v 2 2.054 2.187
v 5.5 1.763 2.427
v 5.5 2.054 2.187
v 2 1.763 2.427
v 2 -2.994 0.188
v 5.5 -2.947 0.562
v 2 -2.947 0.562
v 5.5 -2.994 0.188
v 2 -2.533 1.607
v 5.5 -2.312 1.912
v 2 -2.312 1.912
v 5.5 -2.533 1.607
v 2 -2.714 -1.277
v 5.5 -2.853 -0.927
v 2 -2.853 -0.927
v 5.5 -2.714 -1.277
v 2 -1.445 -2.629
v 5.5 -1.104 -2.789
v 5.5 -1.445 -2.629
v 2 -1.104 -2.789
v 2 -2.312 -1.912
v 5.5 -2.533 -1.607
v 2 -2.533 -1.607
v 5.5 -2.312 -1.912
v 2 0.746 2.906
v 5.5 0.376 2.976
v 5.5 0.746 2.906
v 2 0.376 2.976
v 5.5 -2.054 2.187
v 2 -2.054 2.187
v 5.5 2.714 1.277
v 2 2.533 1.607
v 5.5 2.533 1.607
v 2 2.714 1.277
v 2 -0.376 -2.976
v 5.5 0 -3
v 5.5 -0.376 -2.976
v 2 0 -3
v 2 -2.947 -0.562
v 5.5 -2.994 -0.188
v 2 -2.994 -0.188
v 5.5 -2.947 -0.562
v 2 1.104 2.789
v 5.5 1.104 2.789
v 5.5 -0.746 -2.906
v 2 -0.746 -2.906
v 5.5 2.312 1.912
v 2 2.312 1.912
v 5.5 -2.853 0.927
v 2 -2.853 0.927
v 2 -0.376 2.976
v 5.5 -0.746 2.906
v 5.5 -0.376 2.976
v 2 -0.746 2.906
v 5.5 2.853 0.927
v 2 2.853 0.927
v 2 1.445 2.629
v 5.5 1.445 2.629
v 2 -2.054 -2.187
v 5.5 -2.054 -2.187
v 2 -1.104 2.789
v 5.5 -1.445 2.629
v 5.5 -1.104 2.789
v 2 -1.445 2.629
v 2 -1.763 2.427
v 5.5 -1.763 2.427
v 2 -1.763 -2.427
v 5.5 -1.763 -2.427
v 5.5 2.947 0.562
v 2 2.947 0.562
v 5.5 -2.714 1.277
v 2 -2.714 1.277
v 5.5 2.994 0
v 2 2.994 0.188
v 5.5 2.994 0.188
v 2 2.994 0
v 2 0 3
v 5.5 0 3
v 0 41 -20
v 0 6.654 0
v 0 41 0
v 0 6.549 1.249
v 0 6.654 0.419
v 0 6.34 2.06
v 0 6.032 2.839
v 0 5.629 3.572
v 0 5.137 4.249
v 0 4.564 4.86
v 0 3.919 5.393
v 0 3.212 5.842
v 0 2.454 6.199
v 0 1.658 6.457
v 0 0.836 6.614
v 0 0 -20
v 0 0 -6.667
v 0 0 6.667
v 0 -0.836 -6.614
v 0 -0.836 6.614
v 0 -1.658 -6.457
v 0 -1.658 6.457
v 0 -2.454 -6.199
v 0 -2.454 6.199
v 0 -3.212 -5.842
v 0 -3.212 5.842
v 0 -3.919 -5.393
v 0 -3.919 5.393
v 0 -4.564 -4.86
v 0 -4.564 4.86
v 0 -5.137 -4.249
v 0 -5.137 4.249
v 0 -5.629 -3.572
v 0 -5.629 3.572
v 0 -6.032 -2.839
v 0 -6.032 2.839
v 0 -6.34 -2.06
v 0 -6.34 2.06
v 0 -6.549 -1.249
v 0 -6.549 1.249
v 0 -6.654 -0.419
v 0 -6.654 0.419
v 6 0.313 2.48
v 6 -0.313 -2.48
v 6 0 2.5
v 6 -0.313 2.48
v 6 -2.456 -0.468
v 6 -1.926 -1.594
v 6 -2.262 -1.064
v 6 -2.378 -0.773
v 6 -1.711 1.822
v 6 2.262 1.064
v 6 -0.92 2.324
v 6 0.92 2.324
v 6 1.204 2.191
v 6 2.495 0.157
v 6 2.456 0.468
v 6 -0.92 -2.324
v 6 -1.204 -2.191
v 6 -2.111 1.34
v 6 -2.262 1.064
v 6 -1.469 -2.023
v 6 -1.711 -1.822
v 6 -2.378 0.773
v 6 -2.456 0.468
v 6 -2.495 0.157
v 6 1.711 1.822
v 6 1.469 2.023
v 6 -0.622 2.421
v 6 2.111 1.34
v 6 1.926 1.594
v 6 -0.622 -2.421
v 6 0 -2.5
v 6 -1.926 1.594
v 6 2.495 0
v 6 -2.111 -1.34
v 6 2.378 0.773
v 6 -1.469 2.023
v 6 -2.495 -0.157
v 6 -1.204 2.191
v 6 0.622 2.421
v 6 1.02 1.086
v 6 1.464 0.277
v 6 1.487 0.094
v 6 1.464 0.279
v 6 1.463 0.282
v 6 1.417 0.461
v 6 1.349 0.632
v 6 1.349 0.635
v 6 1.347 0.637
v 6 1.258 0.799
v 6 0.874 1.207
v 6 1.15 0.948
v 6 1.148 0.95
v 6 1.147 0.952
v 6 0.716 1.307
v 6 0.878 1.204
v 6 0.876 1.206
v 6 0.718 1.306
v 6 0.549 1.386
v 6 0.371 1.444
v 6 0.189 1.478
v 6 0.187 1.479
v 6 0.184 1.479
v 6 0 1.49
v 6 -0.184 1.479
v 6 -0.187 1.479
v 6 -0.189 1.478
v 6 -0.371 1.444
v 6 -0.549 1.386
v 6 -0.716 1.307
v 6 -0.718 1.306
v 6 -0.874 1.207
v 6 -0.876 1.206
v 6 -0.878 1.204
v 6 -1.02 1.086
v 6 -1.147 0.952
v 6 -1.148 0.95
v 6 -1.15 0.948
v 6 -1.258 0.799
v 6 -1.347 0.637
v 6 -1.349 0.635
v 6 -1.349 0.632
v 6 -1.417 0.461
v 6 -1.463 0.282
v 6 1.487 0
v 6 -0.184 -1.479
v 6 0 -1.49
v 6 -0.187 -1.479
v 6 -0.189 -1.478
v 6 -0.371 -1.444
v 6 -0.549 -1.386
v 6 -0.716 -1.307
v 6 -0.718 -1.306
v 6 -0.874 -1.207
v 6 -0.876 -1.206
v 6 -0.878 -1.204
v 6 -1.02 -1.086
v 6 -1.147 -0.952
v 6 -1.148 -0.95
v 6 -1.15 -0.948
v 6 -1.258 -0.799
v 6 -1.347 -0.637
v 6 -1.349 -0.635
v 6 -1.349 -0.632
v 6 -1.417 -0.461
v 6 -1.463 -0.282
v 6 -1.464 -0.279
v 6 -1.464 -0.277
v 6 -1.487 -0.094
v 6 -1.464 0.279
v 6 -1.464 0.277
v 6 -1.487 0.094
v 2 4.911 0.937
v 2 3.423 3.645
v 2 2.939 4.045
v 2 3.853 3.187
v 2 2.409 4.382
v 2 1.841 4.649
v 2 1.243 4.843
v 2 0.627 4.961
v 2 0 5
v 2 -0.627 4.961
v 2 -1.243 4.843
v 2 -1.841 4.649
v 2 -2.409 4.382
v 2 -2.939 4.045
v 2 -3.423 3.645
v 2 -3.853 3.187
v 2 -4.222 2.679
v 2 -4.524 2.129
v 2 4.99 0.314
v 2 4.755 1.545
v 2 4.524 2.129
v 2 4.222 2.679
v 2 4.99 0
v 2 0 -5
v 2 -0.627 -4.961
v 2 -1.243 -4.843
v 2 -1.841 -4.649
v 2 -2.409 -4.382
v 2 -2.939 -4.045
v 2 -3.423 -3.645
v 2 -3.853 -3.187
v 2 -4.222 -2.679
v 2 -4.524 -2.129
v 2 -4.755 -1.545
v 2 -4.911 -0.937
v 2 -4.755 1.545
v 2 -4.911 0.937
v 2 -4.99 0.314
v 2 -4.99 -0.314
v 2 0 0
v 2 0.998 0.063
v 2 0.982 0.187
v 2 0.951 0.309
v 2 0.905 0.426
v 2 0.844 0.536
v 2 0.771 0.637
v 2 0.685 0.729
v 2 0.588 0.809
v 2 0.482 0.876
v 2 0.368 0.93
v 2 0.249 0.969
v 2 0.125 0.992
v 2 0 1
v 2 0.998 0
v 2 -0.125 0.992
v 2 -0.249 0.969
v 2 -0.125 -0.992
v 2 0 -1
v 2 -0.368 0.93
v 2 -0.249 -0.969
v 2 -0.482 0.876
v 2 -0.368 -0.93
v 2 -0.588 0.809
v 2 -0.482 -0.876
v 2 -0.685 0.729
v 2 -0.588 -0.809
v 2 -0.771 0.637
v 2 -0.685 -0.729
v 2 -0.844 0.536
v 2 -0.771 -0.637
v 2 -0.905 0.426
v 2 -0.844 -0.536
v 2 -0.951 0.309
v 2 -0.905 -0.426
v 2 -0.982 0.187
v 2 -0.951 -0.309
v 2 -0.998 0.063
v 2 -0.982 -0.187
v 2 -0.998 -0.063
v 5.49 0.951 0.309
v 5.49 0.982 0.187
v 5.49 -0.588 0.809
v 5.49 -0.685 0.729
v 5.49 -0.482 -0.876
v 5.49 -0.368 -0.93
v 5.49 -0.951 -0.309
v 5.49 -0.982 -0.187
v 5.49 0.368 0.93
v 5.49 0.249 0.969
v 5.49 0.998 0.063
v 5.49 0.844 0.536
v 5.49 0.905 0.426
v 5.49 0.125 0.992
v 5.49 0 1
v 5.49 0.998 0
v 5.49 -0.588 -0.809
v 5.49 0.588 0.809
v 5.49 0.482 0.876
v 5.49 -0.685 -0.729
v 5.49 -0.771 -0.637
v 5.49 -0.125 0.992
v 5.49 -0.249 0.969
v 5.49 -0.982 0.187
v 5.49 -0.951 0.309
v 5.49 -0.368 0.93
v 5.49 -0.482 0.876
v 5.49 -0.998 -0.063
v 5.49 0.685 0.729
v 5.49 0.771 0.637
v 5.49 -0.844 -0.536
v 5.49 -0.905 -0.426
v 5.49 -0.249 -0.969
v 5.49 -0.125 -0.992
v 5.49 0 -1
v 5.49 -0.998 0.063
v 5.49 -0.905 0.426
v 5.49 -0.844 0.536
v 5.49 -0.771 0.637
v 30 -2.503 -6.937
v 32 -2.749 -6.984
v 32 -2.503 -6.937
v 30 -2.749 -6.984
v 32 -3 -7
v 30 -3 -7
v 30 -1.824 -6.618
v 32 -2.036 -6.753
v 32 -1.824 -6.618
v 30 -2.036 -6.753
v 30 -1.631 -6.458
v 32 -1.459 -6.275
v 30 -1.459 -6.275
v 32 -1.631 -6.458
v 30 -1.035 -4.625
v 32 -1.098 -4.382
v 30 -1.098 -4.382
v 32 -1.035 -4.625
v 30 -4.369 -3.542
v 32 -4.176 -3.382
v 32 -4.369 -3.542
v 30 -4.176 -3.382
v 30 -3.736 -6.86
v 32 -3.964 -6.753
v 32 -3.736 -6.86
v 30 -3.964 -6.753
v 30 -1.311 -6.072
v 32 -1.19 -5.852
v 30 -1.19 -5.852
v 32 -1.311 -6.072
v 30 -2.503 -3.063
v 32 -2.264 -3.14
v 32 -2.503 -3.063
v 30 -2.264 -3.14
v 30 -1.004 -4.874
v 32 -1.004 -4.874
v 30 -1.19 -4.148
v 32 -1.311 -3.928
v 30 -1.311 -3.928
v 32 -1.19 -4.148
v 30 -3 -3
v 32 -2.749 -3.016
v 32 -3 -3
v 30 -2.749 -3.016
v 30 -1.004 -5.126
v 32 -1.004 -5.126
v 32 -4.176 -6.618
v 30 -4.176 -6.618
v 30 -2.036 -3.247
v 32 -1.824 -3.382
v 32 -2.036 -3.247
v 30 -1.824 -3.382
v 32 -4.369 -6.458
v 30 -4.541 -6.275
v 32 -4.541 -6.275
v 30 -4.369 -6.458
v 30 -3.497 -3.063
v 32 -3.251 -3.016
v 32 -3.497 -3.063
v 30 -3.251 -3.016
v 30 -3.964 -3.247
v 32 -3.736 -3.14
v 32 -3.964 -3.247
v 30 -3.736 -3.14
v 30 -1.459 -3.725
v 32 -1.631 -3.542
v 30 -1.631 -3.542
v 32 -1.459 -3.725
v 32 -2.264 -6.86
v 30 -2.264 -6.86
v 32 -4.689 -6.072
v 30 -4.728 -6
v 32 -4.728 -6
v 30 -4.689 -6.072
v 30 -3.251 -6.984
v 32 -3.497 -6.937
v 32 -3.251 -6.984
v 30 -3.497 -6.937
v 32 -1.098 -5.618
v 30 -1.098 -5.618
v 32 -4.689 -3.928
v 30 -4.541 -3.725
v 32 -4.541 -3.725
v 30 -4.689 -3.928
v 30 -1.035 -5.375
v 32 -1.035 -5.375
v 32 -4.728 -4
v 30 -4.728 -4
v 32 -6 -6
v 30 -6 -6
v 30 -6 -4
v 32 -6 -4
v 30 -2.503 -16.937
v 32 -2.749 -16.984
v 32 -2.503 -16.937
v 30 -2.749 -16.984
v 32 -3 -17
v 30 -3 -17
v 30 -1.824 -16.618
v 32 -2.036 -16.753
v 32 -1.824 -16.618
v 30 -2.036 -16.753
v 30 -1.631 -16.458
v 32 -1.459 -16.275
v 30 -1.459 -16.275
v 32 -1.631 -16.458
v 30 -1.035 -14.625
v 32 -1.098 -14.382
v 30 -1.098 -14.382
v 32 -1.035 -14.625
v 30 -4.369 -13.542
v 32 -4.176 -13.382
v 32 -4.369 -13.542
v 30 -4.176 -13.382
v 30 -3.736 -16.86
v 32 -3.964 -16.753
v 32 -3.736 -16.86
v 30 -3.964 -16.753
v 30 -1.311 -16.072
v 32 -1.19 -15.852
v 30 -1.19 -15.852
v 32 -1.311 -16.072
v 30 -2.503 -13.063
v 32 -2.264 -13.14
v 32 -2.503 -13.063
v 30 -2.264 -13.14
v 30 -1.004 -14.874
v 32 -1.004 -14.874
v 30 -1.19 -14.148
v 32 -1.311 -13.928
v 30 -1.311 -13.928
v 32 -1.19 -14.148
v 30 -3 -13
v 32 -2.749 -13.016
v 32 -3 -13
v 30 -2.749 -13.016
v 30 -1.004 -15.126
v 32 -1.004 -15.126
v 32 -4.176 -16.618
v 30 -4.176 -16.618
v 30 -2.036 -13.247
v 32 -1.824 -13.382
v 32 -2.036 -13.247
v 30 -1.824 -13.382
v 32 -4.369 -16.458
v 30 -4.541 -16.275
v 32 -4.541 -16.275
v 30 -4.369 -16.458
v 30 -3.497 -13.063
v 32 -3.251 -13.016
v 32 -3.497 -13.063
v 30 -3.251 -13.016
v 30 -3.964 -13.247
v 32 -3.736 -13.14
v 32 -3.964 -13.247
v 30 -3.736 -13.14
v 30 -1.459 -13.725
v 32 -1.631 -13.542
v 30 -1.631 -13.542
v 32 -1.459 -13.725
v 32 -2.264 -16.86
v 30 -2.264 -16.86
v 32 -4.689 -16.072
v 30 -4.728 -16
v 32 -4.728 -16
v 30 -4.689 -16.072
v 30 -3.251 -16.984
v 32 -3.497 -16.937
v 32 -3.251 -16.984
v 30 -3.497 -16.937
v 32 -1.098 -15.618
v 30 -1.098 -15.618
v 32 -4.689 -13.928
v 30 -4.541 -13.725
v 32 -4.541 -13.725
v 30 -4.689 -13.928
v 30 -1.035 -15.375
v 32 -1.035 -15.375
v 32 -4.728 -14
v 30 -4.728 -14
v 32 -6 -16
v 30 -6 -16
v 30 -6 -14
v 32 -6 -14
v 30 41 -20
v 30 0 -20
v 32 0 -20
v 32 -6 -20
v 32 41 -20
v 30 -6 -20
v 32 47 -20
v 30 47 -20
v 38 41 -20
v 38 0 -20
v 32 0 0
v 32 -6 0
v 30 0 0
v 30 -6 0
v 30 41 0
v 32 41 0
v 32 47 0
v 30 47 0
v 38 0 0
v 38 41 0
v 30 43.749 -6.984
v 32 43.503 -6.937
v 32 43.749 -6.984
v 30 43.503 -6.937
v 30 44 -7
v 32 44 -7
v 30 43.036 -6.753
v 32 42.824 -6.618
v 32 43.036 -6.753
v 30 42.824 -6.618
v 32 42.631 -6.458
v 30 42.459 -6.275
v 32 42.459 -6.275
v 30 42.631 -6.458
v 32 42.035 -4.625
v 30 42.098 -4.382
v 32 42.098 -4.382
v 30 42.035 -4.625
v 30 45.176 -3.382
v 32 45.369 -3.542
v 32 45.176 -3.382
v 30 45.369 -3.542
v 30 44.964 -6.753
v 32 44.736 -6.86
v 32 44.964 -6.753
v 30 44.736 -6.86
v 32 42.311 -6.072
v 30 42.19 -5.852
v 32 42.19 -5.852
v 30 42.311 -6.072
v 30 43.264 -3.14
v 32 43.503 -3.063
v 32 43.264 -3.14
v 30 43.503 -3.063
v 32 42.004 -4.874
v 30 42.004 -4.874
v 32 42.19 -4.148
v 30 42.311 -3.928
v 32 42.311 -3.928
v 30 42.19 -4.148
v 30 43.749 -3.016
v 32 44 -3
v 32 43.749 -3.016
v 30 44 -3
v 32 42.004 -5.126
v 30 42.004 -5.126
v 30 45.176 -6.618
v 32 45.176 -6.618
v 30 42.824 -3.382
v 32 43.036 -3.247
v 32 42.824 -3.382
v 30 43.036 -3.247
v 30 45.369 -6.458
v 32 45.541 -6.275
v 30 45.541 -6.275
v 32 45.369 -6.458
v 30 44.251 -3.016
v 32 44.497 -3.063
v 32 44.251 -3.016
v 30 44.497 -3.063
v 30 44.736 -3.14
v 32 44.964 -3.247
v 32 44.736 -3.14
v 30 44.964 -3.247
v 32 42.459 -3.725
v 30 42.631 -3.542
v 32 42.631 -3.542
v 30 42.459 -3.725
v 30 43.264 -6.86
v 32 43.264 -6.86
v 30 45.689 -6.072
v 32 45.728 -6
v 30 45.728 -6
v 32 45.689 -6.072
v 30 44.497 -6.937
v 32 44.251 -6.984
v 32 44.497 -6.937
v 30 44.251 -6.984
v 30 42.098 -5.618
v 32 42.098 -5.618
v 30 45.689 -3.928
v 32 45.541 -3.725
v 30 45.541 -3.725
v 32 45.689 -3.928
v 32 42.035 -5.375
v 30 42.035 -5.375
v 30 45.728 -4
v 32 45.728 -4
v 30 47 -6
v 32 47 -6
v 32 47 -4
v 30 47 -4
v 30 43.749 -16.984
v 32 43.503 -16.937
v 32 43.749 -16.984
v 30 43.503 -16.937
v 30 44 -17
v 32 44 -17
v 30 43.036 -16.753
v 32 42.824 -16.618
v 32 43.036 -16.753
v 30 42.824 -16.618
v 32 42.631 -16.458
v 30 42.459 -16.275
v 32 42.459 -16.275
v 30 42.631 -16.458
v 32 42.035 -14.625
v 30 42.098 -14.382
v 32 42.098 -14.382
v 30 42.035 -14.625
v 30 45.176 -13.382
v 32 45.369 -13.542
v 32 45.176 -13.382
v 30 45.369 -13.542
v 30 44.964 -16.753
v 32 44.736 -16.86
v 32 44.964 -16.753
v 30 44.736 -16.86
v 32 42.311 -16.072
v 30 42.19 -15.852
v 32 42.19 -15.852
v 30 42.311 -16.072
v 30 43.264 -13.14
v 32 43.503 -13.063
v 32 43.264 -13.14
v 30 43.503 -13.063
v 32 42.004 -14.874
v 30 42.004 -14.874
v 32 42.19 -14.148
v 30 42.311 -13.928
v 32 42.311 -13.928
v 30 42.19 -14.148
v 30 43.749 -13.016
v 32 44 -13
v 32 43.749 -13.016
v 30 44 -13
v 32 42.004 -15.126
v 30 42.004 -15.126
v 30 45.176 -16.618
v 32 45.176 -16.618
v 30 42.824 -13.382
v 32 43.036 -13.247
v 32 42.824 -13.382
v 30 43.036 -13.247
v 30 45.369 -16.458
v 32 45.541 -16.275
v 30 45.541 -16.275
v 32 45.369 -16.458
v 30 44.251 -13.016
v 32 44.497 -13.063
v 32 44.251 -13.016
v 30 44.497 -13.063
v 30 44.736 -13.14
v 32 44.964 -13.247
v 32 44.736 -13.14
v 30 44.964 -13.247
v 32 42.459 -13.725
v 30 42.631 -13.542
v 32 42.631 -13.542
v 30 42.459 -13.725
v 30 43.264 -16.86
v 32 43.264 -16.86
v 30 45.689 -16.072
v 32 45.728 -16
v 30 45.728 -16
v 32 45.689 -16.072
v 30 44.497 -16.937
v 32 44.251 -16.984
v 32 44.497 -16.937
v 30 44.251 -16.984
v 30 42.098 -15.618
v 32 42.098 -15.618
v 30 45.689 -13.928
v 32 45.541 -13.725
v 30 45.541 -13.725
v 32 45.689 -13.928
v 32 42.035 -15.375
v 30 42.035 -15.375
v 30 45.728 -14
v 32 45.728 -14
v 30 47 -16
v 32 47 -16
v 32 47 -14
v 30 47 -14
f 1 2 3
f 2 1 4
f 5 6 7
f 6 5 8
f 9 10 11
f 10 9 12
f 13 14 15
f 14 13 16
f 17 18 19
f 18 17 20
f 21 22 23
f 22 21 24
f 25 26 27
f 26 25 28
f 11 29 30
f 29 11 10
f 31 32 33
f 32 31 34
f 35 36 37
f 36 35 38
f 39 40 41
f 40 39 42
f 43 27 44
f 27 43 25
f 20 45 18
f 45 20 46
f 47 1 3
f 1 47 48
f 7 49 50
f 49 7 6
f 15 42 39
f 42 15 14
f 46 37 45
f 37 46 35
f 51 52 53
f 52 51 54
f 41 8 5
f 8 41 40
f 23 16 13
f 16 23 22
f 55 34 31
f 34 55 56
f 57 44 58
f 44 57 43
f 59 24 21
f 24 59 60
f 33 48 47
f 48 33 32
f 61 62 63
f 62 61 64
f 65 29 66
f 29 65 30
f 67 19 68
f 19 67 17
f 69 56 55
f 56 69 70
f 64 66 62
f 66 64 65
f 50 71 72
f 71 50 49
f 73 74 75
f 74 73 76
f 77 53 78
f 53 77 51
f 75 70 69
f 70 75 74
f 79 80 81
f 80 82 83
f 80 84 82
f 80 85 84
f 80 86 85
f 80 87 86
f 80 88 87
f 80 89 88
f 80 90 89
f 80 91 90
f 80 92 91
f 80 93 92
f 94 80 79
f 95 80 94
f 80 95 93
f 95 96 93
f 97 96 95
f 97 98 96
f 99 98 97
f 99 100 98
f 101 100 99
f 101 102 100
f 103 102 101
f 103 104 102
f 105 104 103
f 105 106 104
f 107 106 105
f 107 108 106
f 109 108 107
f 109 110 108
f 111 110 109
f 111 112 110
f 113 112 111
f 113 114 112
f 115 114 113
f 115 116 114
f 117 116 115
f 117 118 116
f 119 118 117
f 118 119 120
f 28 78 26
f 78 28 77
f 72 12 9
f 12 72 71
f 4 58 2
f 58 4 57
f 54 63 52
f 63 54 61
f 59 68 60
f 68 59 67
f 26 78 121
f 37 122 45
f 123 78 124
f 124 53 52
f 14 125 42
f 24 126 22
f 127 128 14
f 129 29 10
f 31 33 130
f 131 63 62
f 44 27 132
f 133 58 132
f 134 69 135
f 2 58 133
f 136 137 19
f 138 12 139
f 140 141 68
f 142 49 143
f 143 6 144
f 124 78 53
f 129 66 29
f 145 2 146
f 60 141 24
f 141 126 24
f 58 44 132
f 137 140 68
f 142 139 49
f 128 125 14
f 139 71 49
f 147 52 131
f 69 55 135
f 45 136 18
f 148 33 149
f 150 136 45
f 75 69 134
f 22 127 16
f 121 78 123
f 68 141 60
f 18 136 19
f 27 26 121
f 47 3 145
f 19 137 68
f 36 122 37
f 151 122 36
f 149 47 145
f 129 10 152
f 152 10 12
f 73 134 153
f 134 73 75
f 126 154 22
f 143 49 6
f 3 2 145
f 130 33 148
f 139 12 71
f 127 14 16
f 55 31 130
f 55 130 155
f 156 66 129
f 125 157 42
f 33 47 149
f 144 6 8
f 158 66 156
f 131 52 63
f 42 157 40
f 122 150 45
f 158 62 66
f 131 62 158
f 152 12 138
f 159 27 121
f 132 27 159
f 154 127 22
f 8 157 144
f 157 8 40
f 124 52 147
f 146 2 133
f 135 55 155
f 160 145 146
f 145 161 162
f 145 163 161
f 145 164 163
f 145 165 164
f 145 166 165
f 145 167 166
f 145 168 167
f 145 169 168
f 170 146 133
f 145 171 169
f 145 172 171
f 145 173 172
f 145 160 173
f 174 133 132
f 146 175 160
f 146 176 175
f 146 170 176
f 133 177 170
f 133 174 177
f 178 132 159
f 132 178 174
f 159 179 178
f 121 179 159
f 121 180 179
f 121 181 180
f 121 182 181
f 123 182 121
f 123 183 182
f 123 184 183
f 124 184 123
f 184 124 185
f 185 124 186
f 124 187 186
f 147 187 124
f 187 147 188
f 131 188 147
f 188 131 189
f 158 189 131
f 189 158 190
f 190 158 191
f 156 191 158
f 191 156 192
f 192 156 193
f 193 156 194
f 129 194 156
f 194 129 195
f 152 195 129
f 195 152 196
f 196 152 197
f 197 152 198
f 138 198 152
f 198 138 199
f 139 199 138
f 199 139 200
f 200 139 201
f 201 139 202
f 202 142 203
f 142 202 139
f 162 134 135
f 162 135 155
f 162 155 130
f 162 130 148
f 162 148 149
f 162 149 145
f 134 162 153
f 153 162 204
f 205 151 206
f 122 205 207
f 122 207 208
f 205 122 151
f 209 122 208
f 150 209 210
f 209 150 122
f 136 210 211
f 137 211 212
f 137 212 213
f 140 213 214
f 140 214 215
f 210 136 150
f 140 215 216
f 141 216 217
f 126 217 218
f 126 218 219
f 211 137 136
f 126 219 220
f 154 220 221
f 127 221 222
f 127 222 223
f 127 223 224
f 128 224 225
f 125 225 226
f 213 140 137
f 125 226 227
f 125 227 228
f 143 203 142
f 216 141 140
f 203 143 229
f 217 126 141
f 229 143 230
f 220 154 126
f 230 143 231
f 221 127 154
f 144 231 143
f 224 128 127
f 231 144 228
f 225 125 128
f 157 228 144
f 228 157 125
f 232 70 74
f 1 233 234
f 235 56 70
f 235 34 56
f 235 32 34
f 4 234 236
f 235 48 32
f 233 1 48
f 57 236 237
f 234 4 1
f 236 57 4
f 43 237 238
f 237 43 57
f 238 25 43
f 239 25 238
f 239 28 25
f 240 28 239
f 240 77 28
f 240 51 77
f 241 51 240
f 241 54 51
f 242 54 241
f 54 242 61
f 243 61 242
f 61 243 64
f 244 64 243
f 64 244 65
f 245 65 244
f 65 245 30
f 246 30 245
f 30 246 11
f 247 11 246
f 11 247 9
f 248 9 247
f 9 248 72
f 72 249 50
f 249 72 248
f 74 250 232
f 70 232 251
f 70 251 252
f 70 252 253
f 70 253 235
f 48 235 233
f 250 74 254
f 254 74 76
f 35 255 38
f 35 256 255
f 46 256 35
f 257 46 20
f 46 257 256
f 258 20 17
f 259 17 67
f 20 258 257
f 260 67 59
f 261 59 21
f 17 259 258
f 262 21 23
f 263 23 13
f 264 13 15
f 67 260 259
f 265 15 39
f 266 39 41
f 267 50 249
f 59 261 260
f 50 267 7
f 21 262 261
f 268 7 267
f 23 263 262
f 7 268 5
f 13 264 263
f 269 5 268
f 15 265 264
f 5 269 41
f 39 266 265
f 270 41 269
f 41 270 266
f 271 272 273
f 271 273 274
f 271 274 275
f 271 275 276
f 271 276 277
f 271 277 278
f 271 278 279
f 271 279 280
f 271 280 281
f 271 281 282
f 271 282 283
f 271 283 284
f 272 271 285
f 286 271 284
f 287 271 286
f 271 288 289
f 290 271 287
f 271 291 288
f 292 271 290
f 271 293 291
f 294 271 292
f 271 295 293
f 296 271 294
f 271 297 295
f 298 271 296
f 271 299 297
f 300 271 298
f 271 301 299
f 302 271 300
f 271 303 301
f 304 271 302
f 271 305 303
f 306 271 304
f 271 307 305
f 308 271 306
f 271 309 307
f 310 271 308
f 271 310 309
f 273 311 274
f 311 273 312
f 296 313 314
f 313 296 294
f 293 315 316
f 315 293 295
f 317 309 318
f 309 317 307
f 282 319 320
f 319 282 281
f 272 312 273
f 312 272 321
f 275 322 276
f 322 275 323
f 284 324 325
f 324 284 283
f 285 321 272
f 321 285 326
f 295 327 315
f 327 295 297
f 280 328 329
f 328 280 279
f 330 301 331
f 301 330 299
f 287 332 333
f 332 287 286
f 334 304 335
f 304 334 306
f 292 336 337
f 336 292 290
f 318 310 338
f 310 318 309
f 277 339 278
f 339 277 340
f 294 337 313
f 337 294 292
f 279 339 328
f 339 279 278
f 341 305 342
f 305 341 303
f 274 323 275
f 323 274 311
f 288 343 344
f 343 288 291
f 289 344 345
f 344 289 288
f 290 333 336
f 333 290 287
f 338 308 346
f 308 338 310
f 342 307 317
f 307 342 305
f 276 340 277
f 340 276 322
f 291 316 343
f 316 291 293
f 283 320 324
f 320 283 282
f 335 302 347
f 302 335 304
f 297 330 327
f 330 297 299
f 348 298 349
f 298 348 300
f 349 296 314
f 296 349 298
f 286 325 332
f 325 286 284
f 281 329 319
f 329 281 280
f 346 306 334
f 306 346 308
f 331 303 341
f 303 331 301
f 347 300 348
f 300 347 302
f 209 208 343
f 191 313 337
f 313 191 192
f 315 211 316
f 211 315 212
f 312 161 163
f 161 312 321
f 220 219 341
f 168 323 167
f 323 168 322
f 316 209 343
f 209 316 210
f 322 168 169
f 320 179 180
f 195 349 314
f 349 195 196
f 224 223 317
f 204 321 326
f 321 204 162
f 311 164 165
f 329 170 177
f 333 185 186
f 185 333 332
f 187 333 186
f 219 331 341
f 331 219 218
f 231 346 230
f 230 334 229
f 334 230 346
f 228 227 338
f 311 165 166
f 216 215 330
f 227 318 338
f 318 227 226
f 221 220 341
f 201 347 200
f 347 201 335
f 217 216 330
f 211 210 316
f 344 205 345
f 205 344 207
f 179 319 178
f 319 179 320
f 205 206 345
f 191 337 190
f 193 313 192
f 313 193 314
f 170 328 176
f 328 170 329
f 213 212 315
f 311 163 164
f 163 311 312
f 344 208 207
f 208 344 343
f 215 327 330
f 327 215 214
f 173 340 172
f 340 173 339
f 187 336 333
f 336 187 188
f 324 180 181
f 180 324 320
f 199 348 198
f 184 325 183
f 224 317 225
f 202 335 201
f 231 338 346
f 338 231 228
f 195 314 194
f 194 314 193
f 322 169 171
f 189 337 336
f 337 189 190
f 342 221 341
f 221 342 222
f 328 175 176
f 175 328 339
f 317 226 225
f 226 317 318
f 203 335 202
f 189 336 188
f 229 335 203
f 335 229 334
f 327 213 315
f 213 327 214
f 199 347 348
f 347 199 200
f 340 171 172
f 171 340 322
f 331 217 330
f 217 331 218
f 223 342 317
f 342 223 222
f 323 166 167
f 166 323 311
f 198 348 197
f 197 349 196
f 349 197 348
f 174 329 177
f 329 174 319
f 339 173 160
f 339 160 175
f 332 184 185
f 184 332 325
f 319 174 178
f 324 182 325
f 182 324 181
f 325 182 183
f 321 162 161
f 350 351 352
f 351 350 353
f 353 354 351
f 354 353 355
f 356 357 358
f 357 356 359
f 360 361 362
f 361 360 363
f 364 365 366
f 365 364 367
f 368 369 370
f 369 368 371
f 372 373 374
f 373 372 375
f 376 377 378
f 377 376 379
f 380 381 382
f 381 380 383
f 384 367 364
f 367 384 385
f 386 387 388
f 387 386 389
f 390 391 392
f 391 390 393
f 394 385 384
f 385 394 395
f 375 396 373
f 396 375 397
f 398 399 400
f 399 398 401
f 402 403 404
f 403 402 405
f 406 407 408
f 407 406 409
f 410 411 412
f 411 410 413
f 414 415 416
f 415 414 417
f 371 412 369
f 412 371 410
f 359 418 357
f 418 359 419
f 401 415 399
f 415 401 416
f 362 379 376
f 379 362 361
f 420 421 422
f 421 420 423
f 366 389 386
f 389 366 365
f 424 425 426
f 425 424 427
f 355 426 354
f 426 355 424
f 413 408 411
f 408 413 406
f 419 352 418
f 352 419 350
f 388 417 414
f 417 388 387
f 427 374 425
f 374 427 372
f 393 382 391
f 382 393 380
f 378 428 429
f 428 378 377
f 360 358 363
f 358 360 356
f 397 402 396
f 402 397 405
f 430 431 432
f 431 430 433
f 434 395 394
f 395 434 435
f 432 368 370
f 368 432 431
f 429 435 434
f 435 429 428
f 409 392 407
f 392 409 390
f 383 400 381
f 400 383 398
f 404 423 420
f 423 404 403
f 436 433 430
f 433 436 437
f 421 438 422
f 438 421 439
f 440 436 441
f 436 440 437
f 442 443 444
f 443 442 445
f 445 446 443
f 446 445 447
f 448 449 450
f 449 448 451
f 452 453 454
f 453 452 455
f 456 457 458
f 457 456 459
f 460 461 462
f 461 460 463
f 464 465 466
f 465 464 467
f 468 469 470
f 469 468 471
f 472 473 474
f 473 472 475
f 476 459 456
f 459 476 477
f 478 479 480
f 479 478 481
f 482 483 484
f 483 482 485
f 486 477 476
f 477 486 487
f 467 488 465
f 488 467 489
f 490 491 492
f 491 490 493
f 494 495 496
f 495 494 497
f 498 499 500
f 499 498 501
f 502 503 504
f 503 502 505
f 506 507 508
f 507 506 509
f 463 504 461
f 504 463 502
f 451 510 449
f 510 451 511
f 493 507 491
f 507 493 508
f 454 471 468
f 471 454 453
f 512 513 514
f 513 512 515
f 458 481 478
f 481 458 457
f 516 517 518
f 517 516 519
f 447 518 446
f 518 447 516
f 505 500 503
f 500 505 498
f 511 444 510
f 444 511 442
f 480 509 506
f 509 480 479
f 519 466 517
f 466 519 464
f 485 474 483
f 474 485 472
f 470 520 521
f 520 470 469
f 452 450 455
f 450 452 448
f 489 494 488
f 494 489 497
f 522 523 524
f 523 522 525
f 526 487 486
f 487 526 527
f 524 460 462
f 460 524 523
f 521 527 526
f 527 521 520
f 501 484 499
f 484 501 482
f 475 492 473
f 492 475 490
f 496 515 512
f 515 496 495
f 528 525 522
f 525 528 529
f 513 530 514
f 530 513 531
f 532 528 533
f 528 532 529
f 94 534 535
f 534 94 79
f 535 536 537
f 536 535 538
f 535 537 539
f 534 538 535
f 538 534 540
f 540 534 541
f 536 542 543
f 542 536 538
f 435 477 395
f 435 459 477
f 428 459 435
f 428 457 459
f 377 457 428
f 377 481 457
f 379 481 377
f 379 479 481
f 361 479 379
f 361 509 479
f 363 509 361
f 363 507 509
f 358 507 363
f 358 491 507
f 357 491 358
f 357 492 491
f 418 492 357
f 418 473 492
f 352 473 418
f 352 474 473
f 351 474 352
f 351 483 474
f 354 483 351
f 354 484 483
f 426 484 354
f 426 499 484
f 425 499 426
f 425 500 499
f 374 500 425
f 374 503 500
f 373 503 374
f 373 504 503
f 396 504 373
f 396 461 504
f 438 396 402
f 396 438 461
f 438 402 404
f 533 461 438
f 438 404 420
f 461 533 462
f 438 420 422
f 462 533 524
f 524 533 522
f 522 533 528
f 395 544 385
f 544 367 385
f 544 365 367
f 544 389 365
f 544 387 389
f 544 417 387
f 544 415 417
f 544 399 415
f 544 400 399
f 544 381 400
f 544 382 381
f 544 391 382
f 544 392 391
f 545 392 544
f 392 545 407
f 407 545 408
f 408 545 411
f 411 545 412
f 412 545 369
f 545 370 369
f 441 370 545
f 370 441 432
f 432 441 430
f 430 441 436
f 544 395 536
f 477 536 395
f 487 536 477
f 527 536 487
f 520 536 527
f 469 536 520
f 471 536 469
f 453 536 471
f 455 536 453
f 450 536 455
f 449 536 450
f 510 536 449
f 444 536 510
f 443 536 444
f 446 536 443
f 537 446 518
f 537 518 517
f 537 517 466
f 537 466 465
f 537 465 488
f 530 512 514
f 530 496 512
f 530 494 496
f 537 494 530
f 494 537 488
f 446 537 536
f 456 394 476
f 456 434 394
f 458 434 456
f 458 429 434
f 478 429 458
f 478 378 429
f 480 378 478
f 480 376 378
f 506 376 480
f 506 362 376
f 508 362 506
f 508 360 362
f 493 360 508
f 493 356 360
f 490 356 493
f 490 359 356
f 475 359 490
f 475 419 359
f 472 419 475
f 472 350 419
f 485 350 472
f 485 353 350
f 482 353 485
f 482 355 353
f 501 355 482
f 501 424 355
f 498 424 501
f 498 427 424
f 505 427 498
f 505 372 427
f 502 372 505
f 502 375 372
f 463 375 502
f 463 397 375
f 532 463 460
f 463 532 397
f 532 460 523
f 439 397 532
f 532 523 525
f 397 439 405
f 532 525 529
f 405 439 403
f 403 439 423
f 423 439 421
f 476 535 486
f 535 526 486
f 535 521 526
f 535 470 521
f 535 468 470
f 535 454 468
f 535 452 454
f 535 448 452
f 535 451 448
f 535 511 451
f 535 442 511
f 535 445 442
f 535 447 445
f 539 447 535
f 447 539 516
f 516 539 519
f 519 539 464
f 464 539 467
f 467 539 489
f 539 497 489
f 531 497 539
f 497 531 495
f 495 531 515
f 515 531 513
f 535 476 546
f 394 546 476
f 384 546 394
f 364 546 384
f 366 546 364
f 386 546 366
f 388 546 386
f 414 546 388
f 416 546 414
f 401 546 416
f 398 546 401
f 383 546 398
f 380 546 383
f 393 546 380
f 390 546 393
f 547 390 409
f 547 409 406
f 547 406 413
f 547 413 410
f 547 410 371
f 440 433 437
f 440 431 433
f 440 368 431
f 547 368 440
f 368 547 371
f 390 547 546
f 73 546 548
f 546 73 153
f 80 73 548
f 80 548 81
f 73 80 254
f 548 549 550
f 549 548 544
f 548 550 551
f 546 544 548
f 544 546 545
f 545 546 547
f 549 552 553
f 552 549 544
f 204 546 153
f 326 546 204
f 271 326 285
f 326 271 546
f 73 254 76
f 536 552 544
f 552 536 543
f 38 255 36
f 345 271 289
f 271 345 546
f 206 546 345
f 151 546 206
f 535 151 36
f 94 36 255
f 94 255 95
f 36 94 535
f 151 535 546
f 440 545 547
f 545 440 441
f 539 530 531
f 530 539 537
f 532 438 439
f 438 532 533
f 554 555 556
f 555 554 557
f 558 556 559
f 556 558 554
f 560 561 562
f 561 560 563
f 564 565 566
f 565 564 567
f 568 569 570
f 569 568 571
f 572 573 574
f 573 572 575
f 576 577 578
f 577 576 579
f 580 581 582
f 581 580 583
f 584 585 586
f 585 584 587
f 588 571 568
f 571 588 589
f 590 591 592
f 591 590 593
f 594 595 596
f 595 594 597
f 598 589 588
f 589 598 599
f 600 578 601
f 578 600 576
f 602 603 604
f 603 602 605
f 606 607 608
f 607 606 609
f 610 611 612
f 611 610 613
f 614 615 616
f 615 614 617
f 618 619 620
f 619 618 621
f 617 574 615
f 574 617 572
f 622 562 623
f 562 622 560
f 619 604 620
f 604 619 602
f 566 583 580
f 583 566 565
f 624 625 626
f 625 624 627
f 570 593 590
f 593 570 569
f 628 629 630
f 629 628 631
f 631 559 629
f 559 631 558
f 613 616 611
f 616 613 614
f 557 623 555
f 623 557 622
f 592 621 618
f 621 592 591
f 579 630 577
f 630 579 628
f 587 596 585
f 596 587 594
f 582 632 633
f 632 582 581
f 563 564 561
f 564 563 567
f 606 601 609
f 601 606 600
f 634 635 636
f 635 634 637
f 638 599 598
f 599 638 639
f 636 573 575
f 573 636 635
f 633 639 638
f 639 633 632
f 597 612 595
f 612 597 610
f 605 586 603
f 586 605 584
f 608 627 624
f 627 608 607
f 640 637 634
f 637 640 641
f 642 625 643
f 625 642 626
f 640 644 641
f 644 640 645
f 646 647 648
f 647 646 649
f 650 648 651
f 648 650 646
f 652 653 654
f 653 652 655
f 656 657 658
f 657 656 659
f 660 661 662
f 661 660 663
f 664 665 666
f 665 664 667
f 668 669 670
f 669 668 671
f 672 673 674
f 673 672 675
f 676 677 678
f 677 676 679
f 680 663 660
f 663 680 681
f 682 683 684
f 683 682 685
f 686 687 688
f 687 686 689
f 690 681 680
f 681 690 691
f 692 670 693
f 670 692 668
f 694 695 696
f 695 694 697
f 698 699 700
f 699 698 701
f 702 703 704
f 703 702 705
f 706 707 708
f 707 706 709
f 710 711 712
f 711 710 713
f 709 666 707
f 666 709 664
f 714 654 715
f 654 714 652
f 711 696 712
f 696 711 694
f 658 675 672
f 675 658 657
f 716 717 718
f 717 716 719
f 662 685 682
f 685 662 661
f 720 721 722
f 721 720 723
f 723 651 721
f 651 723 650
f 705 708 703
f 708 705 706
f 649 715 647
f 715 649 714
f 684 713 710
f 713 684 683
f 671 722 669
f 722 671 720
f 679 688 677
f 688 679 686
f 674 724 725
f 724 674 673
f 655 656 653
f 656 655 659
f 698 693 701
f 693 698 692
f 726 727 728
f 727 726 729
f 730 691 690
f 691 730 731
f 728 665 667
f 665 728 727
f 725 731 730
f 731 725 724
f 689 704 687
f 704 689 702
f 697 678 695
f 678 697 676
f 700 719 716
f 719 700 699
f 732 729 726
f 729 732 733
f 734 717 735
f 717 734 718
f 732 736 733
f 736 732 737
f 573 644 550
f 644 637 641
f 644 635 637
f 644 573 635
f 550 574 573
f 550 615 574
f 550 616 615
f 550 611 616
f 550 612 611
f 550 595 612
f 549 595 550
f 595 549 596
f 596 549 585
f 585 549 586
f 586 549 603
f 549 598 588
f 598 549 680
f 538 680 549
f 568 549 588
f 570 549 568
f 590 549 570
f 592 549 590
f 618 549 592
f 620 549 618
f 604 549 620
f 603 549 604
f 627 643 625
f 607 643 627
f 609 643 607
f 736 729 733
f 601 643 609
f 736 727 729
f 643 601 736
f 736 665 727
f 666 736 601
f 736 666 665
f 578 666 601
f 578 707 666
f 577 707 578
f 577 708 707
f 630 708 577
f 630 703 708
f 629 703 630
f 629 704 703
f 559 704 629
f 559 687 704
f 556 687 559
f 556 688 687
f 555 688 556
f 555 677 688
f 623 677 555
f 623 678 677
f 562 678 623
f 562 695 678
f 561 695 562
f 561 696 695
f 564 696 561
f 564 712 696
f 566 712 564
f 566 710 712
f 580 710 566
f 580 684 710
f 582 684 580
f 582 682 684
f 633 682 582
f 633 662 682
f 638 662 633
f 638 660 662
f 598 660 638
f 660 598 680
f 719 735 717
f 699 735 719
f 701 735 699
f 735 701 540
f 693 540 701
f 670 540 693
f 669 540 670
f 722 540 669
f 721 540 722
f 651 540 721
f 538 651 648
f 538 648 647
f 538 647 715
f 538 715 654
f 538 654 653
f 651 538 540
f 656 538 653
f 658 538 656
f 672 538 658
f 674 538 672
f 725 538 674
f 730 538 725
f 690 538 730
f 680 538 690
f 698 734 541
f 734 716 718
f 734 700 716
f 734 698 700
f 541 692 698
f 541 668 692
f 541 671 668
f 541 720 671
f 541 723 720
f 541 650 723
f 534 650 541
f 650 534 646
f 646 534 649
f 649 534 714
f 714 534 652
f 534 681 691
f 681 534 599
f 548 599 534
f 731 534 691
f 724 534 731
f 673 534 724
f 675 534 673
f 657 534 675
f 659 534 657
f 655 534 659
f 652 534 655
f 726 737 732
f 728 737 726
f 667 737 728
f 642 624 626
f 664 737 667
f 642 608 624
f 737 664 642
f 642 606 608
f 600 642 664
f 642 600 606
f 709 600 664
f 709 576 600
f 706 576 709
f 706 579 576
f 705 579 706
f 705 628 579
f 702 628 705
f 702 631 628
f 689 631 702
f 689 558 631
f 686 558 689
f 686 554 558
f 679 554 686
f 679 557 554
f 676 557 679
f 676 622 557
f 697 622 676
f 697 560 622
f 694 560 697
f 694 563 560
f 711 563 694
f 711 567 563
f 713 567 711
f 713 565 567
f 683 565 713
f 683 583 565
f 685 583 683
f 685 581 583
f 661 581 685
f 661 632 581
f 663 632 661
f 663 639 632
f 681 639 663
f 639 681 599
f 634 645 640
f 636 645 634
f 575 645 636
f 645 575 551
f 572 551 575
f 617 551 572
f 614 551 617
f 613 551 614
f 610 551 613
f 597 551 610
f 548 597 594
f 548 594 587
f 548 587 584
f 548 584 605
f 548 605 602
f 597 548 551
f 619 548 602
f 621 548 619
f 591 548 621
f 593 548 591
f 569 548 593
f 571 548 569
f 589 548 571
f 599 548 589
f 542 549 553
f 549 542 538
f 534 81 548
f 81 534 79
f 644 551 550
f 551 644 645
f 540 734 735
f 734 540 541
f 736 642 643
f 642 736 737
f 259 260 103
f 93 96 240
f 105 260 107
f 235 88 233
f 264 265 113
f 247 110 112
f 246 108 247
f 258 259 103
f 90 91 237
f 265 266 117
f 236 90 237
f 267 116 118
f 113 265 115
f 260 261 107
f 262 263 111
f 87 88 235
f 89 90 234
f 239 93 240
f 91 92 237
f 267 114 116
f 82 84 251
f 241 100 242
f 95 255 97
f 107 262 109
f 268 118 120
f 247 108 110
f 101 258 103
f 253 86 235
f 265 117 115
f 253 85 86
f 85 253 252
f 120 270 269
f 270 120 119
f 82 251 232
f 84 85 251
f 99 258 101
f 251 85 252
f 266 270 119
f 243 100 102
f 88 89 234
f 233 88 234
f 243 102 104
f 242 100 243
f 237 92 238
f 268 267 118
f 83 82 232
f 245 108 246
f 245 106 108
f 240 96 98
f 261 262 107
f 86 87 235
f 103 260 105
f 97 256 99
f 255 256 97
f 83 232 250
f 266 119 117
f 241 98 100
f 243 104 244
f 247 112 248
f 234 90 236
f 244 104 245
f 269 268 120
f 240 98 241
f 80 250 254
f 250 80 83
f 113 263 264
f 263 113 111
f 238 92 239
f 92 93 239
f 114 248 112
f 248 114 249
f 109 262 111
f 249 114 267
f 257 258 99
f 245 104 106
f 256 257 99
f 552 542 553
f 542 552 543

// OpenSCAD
// file: servo.scad
module _servo_mounting_ear(a, b, c, d, e, f)
{
	difference() {
		cube(size=[d, (e-b)/2, 2]);
		union() {
			translate([5, 3, -0.5]) {
				cylinder(r=2, h=3);
				translate([-1, -3.5, 0]) cube([2, 2, 3]);
			}
			translate([15, 3, -0.5]) {
				cylinder(r=2, h=3);
				translate([-1, -3.5, 0]) cube([2, 2, 3]);
			}
		}
	}
}

module servo(a, b, c, d, e, f, x) {
	translate([-d/2, -(x), -a])
	union() {
		// Axle
		color("Gold") {
			translate([d/2, x, c]) {
				difference() {
					union() {
						cylinder(r=3, h=a-c-0.5);
						translate([0, 0, a-c-0.5]) cylinder(r1=3, r2=2.5, 0.5);
					}
					union() {
						translate([0, 0, 2]) cylinder(r=1, h=a-c-0.5);
						translate([0, 0, a-c-0.51]) cylinder(r1=1, r2=1.5, 0.52);
					}
				}
			}
		}
		// Body
		color("DarkGray") {
			translate([d/2, x, c-1]) cylinder(h=2, r1=d/3, r2=d/4);
			cube(size=[d, b, c-1]);
			// Mounting brackets
			translate([0, -(e-b)/2, f]) {
				_servo_mounting_ear(a, b, c, d, e, f);
			}
			translate([0, b+(e-b)/2, f])
			mirror ([0, 1, 0]) {
				_servo_mounting_ear(a, b, c, d, e, f);
			}
		}
	}
}
// main file
$fn = 50;

use <servo.scad>;

a = 45;
b = 41;
c = 39;
d = 20;
e = 53;
f = 30;


rotate([0, 90, 0]) servo(a, b, c, d, e, f);
/*
t = 3; // Thickness
translate([-(a + t), -(d/2 + 1 + t), -(d/2 + t)]) 
color("Blue") {
	cube([t, b + 2*t, d + 2*t]);
	translate([t, 0, t]) cube([f, t, d]);
	translate([t, b+t, t]) cube([f, t, d]);
}*/
